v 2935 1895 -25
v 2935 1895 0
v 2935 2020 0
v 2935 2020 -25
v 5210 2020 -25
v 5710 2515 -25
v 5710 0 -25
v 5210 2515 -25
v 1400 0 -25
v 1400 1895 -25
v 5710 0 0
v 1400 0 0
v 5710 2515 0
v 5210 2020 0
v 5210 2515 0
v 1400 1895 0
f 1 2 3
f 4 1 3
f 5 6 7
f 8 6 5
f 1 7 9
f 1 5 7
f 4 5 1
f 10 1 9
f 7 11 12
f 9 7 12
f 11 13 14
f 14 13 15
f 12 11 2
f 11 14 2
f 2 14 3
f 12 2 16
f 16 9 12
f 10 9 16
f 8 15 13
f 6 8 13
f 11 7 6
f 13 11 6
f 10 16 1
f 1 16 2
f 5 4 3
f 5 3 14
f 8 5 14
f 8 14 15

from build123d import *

# Parameters (mm, degrees)
TABAN_FLAN_1_DEPTH         = 25
KES_EKSTR_ZYON1_DEPTH      = 6508.676543898
KES_EKSTR_ZYON1_DEPTH_BACK = 6508.676543898
IZIM7_W                    = 1400
IZIM7_H                    = 1895
IZIM7_W_2                  = 310
IZIM7_H_2                  = 495
KES_EKSTR_ZYON2_DEPTH      = 6508.676543898
KES_EKSTR_ZYON2_DEPTH_BACK = 6508.676543898
IZIM8_W                    = 292
IZIM8_H                    = 2515


# Sheet-metal steps are written as plain solids
with BuildPart() as part:
    # Çizim1 → Taban-Flanş1 (new body)
    with BuildSketch(Plane.XY):
        Polygon((0, 0), (0, 1895), (2935, 1895), (2935, 2020), (4900, 2020), (4900, 2515), (6002, 2515), (6002, 0), align=None)
    extrude(amount=-TABAN_FLAN_1_DEPTH)

    # Çizim7 → Kes-Ekstrüzyon1 (cut, two sides: drawn at the far end of the back side and taken through both)
    with BuildSketch(Plane.XY.offset(-KES_EKSTR_ZYON1_DEPTH_BACK)):
        with Locations((700, 947.5)):
            Rectangle(IZIM7_W, IZIM7_H)
        with Locations((5055, 2267.5)):
            Rectangle(IZIM7_W_2, IZIM7_H_2)
    extrude(amount=KES_EKSTR_ZYON1_DEPTH + KES_EKSTR_ZYON1_DEPTH_BACK, mode=Mode.SUBTRACT)

    # Çizim8 → Kes-Ekstrüzyon2 (cut, two sides: drawn at the far end of the back side and taken through both)
    with BuildSketch(Plane.XY.offset(-KES_EKSTR_ZYON2_DEPTH_BACK)):
        with Locations((5856, 1257.5)):
            Rectangle(IZIM8_W, IZIM8_H)
    extrude(amount=KES_EKSTR_ZYON2_DEPTH + KES_EKSTR_ZYON2_DEPTH_BACK, mode=Mode.SUBTRACT)


solid = part.part
